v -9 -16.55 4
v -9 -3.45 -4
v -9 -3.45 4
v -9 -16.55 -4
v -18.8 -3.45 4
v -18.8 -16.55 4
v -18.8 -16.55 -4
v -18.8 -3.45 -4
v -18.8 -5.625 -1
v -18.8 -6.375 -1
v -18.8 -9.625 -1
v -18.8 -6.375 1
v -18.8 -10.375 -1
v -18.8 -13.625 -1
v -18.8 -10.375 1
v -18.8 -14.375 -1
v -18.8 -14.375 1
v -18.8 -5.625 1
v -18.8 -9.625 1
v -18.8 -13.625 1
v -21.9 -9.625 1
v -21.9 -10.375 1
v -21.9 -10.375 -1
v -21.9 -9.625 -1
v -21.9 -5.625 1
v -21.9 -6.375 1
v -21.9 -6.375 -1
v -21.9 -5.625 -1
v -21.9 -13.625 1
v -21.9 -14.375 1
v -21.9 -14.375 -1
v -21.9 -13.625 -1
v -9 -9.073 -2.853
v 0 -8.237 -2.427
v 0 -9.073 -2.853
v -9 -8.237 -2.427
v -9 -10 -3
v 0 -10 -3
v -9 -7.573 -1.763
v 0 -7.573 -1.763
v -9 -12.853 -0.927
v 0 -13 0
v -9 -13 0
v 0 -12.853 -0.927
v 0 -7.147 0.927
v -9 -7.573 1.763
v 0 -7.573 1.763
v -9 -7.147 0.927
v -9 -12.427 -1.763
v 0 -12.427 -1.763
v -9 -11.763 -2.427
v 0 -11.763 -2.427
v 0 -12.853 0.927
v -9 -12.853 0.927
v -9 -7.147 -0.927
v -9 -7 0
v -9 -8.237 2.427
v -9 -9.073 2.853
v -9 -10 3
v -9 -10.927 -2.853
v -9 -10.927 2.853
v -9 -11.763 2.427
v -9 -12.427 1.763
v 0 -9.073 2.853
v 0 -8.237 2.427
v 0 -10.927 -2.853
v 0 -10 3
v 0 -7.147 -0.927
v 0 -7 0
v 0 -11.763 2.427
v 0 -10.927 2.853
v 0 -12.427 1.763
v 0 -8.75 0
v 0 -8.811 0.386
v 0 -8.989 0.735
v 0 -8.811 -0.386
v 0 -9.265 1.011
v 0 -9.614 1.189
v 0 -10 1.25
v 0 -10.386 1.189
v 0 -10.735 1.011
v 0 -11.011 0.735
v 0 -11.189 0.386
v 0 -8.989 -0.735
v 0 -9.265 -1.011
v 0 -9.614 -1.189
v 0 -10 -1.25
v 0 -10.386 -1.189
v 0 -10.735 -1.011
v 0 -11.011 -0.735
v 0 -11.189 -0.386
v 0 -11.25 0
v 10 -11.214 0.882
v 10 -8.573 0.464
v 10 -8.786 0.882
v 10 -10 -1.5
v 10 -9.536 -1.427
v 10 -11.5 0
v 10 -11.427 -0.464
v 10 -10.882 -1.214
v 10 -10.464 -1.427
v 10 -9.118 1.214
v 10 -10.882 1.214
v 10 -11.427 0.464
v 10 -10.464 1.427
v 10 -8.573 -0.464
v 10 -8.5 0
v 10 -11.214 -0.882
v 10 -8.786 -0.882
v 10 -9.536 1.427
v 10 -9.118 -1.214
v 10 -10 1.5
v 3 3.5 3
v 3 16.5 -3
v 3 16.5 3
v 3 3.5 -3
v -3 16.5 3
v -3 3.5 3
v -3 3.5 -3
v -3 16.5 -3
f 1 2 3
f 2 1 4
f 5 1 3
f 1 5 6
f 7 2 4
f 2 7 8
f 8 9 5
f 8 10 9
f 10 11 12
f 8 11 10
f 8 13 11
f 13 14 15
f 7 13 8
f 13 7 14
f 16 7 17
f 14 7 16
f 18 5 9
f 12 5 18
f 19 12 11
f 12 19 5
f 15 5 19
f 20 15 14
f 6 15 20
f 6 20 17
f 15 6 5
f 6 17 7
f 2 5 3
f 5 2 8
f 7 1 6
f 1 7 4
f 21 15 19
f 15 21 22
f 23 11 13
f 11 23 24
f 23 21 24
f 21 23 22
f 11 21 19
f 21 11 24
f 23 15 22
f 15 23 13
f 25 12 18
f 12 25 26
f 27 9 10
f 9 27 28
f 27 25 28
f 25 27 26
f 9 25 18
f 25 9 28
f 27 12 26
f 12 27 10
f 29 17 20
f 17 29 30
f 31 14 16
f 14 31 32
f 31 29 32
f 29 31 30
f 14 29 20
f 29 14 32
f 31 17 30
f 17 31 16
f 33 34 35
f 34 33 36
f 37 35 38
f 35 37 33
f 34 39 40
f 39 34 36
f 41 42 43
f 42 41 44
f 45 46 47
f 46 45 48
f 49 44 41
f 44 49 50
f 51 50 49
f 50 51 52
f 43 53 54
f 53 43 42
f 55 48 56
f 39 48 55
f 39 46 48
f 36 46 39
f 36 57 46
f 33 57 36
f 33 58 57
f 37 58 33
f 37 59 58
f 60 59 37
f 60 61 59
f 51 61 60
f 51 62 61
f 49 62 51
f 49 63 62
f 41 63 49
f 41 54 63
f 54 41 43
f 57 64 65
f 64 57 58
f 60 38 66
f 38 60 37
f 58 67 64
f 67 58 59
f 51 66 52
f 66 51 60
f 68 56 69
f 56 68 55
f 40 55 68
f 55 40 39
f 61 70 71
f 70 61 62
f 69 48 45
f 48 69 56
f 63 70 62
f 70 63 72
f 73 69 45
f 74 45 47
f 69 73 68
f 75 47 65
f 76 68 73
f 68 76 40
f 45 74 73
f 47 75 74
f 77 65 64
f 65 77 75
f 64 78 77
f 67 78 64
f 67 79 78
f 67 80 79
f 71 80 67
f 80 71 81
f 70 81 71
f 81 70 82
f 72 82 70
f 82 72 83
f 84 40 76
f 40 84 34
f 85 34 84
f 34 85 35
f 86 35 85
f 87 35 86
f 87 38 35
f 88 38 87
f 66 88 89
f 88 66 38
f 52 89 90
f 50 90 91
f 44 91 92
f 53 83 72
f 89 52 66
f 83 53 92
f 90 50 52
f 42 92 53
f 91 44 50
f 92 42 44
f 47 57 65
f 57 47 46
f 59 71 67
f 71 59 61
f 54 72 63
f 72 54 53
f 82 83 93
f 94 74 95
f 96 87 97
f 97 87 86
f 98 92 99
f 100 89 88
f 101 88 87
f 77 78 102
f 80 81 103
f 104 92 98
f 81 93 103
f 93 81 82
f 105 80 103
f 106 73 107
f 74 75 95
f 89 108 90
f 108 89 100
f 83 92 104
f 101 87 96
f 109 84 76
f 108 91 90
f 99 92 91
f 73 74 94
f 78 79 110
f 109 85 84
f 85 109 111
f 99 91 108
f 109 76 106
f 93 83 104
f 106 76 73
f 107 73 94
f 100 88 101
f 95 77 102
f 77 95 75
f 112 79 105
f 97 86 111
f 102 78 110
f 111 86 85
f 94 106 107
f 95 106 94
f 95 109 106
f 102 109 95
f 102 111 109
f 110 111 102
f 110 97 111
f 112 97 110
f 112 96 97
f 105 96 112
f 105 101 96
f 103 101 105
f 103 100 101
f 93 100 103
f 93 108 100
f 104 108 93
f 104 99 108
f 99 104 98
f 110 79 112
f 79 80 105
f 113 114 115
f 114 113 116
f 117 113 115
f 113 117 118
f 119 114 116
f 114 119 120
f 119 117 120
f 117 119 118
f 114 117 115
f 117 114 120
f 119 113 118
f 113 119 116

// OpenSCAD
// file: variables.scad
innerWidth = 38;
innerLength = 80;
innerHeight = 25;
minEdgeWidth = 2.5;
largeEdgeWidth = 6;
holeRadius = 2;
boxSpacing = 4;
stickRadius = 7.1; // fixed by table

sensorScrewHoleRadius = 2.5/2;

// PCBVariables
	PCBWidth = 35.2;
	PCBBoardLength = 70;
	PCBLength = 80;// 70;
	PCBHeight = 1.5;
	PCBBoardToBoardHeight = 13.9; // height of the two layers of pcb and the pinheaders between them
	
	PCBToBottomSpacing = 3; // space for wires on bottom of PCB
	PCBToTopSpacing = 2; // Air gap between pcb components and stick
	PCBNotchWidth = 1.5; // user definable
	PCBComponentsHeight = 17.1-PCBBoardToBoardHeight; // Height of pCB components on top of top layer pcb

	PCBSensorBoardLength = 15.75;
	PCBSensorBoardWidth = 21;
	PCBSensorBoardOverhang = 7.4; // The length of sensor board that overhangs the main print board
	PCBSensorBoardYOffset = -1.5/2;
	PCBSensorBoardHoleRadius = 1.5;
	PCBSensorBoardHoleCenterYDistance = 12.3+PCBSensorBoardHoleRadius*2;

// BatteryBoxVariables
	batteryRadius = 18.3/2;
	batteryLenght = 65;

// Bolts
	boltHeight = 2.4;
	boltWidth = 5.4;
	boltSegmentWidth = 3.2;

// Switch
	SwitchBaseLength = 9.8;
	SwitchBaseWidth = 13.1;
	SwitchBaseHeight = 8;

	SwitchCylinderRadius = 6/2;
	SwitchCylinderLength = 9;
	SwitchLegLength = 4;

// switch_alt
	SwitchAltWidth = 13;
	SwitchAltHeight = 6;
	SwitchAltDepth = 6;
	SwitchPinLength = 4;
	SwitchAltFlipperHeight = 7;


MaxLength = 85; // fixed by table
MinWidth = max(batteryRadius*4, PCBWidth)+2*largeEdgeWidth;
MinHeight = max(batteryRadius*2, PCBToTopSpacing+PCBComponentsHeight+PCBBoardToBoardHeight+PCBToBottomSpacing)+stickRadius+minEdgeWidth;
// main file
include <variables.scad>

translate([0, -10, 0])
switch();
translate([0, 10, 0])
switch_alt();

module switch() {
	translate([-SwitchCylinderLength, 0, 0]) {
		translate([-SwitchBaseLength/2, 0, 0]) {
			color("Blue")
			cube([SwitchBaseLength, SwitchBaseWidth, SwitchBaseHeight], center=true);
			translate([-6, 0, 0])
			cube([SwitchLegLength, 0.75, 2], center=true);
			translate([-6, 4, 0])
			cube([SwitchLegLength, 0.75, 2], center=true);
			translate([-6, -4, 0])
			cube([SwitchLegLength, 0.75, 2], center=true);
		}
		rotate([0, 90, 0]) {
			cylinder(SwitchCylinderLength, r=SwitchCylinderRadius, center=false, $fn=20);
			translate([0, 0, SwitchCylinderLength])
			cylinder(10, r1=2.5/2, r2=3/2, center=false, $fn=20);
		}
	}
}

module switch_alt() {

	// SwitchAltWidth = 13;
	// SwitchAltHeight = 6;
	// SwitchAltDepth = 6;
	// SwitchPinLength = 4;
	// SwitchAltFlipperHeight = 7;
	cube([SwitchAltDepth,SwitchAltWidth, SwitchAltHeight], center=true);
}
